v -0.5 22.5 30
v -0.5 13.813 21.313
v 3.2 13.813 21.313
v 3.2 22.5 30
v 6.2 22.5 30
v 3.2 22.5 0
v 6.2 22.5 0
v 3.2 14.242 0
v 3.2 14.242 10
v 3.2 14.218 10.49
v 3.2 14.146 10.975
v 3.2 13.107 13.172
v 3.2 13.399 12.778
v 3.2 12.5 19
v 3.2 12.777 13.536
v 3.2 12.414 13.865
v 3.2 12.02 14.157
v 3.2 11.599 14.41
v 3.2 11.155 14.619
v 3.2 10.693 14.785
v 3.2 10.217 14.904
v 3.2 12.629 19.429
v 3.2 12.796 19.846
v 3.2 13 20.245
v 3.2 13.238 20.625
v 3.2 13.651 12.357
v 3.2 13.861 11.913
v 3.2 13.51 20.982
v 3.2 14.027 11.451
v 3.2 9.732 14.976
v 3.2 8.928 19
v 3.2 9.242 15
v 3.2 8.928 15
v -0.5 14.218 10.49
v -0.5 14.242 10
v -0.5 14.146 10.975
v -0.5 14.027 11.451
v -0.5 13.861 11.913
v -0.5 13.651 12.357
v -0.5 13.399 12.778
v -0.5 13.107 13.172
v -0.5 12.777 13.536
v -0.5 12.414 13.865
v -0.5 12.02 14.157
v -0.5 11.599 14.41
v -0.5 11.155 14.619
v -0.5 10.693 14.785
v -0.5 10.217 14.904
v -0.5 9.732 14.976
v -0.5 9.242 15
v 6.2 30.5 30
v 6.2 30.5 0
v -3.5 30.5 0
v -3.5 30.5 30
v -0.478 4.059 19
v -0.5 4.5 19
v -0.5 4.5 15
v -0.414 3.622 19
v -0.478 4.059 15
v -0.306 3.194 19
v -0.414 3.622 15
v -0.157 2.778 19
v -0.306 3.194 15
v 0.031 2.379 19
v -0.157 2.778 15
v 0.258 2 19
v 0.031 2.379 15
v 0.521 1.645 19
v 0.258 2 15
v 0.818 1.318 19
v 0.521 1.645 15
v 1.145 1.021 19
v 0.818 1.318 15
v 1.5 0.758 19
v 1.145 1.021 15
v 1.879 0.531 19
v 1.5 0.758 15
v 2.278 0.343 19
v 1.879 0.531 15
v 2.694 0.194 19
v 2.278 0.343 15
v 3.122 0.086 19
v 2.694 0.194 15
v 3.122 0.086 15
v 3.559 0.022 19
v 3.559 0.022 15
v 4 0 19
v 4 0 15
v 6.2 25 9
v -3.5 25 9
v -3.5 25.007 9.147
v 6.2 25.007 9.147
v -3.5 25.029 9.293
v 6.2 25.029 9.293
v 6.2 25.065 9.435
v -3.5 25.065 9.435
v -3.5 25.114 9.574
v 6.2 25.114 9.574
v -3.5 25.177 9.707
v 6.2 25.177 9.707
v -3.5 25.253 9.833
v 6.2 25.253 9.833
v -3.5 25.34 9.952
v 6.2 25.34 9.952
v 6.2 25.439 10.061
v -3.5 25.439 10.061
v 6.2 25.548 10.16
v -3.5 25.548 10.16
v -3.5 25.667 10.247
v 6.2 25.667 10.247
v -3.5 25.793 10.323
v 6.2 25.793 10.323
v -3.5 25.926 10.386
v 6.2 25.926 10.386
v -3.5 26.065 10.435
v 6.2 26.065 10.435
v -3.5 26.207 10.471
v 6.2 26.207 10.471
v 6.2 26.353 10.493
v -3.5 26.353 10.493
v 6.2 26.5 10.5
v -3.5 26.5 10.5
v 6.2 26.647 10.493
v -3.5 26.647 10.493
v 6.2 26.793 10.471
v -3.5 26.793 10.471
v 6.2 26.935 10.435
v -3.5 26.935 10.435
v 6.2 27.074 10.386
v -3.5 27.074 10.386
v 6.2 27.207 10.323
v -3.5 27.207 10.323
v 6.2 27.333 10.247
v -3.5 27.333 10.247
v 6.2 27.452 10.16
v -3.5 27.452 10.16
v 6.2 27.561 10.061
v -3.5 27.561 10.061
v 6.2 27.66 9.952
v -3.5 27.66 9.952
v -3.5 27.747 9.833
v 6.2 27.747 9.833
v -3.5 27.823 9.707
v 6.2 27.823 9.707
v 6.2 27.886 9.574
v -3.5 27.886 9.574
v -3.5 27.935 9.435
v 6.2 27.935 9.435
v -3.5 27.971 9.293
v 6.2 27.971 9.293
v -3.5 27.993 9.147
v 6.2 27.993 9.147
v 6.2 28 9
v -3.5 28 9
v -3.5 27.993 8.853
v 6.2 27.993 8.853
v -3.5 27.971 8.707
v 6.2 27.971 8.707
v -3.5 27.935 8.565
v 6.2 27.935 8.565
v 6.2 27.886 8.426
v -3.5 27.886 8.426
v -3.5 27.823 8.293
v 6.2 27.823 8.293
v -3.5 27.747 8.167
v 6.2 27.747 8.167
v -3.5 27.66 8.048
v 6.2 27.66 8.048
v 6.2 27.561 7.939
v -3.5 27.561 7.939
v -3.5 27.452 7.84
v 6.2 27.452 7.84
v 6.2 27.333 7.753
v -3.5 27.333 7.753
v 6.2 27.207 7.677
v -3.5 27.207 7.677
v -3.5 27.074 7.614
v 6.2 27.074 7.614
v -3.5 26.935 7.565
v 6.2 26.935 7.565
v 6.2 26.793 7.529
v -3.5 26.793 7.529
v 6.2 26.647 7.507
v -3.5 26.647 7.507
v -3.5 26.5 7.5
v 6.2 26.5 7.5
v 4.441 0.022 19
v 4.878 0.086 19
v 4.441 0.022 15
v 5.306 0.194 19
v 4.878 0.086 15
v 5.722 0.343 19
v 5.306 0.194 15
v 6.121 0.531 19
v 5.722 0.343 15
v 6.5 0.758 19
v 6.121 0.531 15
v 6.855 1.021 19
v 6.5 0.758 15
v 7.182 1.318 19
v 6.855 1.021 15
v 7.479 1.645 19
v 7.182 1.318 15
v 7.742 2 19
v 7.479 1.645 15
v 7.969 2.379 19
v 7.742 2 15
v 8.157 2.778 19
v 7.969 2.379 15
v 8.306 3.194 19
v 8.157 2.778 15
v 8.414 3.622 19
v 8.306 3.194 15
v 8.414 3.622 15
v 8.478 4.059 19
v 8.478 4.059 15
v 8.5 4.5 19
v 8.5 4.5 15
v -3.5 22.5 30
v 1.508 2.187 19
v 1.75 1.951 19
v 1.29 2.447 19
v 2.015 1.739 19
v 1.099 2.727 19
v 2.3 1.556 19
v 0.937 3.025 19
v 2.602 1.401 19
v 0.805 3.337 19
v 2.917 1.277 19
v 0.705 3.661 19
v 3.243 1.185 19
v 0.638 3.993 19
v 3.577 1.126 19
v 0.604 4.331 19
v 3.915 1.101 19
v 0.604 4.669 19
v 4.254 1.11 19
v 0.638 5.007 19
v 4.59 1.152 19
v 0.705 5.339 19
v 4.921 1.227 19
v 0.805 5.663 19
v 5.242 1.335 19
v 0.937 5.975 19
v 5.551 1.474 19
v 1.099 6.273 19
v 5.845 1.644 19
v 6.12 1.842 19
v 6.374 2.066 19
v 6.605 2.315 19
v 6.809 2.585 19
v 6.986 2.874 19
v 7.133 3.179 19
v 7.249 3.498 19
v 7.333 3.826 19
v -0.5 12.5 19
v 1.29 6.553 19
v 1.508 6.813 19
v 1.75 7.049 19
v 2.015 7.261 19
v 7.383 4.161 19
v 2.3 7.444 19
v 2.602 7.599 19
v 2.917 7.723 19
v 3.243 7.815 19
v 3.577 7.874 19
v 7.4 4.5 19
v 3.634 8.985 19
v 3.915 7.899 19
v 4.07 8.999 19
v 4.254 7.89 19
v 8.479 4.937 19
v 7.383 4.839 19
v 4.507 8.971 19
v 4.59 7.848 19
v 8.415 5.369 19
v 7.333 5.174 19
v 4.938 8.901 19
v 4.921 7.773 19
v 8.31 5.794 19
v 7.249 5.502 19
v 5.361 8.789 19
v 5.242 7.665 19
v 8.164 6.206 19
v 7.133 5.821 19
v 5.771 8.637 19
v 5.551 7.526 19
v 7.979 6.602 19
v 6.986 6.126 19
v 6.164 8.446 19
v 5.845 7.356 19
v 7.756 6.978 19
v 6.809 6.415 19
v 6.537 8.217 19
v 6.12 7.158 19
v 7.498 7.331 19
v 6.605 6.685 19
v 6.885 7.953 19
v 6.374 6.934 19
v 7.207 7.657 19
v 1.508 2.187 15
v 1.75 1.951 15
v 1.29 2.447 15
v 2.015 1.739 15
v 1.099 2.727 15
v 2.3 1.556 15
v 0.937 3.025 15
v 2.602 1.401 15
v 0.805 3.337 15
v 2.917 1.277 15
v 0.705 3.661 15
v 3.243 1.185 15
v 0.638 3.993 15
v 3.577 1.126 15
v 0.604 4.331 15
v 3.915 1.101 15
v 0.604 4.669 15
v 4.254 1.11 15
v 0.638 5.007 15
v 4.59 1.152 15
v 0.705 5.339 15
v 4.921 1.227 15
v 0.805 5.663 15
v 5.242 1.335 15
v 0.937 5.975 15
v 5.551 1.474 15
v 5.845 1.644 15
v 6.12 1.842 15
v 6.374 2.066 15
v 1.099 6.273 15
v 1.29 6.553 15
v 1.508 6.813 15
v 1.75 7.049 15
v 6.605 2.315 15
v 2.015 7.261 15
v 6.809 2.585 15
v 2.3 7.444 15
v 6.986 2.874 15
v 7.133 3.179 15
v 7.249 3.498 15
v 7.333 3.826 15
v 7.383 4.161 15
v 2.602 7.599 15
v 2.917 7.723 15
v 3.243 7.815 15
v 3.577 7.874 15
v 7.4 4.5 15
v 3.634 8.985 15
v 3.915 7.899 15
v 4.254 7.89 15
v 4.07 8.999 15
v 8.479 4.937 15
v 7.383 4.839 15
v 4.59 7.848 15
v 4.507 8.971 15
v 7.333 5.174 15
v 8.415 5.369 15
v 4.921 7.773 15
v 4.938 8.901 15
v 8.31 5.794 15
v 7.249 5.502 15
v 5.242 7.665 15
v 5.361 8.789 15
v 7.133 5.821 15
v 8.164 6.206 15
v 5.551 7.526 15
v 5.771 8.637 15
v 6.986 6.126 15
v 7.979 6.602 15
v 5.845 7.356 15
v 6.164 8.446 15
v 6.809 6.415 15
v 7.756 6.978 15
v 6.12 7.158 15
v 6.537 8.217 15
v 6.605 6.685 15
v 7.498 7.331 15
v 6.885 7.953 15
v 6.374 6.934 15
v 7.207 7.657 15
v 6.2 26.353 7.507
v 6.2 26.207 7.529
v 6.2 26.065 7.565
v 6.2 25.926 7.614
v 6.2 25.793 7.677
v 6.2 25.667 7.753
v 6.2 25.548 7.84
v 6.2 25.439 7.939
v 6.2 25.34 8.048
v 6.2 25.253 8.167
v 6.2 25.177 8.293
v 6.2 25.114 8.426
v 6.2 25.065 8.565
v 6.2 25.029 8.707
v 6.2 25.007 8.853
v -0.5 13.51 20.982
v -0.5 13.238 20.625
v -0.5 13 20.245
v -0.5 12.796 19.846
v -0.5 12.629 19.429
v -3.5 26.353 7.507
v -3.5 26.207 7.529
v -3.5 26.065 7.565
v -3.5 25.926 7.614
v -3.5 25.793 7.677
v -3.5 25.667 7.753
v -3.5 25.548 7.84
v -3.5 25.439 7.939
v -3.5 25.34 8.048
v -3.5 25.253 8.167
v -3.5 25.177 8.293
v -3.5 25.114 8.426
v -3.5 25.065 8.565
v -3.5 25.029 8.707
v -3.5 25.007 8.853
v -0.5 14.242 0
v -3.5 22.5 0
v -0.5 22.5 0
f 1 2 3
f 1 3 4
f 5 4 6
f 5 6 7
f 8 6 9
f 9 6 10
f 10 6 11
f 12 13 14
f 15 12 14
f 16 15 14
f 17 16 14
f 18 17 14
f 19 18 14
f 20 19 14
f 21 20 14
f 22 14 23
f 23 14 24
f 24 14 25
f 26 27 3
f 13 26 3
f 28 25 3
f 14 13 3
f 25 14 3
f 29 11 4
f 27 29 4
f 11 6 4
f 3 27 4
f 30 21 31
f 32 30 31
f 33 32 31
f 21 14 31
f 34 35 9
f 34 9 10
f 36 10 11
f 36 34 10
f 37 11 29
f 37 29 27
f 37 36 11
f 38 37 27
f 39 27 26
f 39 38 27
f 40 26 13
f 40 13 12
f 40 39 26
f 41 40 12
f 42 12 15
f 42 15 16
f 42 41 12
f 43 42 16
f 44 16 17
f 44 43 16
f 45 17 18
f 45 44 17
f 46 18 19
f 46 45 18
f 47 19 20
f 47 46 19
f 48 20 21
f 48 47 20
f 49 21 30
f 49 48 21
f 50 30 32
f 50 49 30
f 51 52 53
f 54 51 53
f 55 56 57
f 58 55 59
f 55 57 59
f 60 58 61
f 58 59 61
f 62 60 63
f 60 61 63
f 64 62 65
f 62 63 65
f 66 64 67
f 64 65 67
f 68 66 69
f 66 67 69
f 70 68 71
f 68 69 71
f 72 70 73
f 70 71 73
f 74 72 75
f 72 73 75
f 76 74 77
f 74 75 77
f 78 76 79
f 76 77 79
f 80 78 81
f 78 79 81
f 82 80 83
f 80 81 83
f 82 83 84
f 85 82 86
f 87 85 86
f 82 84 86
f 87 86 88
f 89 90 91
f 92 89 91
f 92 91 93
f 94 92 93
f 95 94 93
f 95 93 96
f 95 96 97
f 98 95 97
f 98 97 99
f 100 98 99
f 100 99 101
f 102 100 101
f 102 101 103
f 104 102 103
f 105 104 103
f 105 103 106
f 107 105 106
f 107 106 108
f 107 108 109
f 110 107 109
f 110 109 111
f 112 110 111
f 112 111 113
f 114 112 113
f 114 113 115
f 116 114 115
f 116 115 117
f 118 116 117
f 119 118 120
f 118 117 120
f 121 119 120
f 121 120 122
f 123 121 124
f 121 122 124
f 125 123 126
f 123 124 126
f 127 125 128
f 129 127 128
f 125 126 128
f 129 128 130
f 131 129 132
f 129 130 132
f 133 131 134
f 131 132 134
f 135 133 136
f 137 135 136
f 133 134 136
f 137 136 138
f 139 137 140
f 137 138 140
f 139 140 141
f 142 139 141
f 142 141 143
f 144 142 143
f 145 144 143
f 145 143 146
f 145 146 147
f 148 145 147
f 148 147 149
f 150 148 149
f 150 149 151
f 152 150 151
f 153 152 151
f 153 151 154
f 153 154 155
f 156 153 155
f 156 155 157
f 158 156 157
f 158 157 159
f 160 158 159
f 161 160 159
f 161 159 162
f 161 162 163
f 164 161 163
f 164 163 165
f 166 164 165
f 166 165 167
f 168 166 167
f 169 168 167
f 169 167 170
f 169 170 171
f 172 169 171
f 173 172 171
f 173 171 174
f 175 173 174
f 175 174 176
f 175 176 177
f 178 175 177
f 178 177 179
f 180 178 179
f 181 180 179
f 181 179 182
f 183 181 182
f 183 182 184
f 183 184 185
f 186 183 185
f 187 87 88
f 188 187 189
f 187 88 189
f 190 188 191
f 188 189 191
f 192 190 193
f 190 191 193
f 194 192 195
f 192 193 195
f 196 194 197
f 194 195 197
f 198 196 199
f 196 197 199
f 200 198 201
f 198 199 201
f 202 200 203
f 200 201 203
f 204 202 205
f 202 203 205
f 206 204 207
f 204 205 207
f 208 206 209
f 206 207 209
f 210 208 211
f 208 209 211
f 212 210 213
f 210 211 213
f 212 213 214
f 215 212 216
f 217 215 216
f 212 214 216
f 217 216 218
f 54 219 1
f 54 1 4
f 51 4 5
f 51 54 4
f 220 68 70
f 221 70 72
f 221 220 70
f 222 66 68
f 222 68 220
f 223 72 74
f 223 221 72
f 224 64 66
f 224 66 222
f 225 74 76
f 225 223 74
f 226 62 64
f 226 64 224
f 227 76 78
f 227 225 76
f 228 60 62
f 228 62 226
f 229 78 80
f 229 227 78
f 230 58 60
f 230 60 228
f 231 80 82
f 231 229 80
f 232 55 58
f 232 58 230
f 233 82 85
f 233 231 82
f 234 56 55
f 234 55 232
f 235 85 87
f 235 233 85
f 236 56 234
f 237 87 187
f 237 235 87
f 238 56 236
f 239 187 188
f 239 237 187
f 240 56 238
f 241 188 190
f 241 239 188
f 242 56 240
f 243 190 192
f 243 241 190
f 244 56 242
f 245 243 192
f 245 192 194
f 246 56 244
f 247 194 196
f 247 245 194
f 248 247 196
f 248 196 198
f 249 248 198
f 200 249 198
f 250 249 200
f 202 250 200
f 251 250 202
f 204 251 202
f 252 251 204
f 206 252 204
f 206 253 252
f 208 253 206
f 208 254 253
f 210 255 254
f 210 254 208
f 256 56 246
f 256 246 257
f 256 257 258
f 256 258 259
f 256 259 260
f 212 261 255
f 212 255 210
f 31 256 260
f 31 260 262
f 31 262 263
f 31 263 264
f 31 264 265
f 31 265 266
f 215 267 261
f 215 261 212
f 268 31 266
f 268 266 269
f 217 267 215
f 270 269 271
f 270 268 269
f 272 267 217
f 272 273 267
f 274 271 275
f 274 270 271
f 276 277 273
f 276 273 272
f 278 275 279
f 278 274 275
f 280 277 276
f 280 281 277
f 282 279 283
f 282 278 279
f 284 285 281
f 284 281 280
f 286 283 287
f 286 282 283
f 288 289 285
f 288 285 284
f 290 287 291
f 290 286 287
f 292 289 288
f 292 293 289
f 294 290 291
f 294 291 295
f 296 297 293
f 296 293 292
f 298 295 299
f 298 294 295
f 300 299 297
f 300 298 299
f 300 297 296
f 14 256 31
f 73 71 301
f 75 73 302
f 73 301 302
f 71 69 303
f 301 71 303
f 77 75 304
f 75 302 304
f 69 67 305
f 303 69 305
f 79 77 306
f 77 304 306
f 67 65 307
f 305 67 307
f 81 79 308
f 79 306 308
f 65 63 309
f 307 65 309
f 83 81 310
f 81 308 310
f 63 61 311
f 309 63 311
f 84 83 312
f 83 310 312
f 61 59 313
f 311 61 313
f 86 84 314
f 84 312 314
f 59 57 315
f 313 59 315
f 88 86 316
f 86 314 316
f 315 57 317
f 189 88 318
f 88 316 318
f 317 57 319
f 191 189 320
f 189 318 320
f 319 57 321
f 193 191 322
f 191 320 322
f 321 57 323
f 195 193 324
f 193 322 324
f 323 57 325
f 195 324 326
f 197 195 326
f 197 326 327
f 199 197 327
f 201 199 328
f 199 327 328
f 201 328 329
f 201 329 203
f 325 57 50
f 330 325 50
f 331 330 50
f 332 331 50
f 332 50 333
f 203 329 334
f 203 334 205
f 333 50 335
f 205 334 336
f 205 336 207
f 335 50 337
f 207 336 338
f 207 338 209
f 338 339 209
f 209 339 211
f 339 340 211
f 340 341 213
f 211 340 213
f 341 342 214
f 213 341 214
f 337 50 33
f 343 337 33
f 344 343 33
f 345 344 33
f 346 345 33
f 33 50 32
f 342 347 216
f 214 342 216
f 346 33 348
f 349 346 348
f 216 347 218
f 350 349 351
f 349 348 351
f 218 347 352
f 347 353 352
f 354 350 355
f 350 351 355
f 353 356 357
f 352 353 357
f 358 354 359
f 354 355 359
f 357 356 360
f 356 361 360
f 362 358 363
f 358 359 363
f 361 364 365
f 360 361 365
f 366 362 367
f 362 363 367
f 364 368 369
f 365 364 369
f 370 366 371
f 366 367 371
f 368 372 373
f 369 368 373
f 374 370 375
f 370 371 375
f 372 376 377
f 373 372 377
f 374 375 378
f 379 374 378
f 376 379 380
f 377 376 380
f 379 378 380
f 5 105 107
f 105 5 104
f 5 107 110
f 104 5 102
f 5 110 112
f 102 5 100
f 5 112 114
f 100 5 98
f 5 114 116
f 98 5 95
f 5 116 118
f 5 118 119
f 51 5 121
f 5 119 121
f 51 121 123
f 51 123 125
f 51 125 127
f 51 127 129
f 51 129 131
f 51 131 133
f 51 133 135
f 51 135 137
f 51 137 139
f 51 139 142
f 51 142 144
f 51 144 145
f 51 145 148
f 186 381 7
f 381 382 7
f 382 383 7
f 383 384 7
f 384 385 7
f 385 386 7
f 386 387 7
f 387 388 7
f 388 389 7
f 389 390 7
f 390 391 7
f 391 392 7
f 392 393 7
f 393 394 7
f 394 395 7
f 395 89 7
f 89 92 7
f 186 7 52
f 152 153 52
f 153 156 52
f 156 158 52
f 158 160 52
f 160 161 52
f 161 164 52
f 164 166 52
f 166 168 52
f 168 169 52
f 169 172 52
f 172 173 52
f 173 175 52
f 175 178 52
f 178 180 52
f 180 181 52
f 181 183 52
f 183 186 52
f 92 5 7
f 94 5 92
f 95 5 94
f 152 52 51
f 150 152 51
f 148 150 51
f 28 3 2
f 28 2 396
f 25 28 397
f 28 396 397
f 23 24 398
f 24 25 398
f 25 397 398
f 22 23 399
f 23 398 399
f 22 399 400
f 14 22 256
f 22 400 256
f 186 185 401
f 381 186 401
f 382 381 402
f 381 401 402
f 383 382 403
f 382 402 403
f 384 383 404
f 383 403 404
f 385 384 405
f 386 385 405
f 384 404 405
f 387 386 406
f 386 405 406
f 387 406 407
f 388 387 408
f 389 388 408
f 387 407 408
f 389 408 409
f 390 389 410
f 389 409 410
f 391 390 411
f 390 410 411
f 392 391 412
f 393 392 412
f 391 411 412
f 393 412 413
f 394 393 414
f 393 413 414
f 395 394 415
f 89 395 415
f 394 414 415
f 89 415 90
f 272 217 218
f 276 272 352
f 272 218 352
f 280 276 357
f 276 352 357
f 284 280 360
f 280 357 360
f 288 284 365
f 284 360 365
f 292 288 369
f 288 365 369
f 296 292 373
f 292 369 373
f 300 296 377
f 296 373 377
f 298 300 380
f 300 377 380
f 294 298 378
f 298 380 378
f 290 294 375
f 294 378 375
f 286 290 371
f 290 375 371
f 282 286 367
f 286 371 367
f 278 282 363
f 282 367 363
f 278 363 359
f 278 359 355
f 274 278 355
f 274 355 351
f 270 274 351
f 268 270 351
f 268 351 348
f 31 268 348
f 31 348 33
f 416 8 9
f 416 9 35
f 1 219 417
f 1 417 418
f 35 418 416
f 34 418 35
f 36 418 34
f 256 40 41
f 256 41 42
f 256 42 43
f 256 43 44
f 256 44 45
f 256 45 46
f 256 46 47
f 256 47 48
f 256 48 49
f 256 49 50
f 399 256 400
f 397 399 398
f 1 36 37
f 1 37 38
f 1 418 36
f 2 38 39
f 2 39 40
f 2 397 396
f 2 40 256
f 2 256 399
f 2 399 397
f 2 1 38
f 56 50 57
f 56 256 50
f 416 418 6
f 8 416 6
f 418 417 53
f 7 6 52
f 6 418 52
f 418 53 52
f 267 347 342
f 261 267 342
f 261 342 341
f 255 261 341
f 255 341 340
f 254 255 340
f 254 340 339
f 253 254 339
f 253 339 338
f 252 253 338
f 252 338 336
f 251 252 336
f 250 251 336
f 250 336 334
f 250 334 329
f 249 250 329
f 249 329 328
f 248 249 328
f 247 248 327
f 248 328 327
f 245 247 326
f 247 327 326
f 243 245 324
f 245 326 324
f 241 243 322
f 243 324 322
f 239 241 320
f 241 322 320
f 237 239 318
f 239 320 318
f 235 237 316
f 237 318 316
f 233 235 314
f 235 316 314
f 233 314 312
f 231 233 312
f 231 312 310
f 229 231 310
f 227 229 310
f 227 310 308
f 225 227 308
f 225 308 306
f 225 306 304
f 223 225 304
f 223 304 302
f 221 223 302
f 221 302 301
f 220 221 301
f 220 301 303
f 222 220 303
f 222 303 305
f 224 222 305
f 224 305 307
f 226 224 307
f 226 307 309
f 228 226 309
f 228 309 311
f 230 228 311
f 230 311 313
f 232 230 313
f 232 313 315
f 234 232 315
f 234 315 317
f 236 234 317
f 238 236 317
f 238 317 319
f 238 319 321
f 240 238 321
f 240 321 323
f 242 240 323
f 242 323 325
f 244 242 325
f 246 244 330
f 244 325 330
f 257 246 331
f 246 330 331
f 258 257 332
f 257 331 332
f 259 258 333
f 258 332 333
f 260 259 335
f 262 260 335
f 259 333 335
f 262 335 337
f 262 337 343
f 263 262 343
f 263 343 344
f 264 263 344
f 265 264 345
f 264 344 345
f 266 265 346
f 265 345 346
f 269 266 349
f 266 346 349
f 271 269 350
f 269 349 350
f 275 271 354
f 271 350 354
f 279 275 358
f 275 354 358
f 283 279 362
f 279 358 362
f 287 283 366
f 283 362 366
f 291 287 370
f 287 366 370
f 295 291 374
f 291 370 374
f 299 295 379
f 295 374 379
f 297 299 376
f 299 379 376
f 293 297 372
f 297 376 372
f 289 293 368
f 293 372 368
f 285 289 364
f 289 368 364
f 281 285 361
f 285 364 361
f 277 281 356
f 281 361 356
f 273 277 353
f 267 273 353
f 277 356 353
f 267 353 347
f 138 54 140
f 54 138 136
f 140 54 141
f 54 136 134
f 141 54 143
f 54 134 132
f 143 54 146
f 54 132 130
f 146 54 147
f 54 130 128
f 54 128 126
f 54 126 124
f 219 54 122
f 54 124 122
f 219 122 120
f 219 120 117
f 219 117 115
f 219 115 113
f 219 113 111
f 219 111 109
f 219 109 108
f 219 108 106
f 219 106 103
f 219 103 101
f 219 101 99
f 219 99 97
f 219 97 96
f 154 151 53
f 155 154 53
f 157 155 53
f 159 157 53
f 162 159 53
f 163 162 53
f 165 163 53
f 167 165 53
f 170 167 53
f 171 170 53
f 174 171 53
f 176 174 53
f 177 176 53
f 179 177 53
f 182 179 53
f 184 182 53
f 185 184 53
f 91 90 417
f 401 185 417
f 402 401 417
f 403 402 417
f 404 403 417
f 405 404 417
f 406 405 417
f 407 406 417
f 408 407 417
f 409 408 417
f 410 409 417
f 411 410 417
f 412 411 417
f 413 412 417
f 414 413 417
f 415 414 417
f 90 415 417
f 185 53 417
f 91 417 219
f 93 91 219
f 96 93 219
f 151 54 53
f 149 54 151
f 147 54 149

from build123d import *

# Parameters (mm, degrees)
F1_DEPTH     = 19
F3_DEPTH     = 11
F4_R         = 3.4
F5_DEPTH     = 25
F8_DEPTH     = 25
F9_T1_DEPTH  = 55.1336597593
F10_DEPTH    = 15
F11_T1_DEPTH = 3.7
F11_T3_DEPTH = 12.9815131525


# Not quite as in the source:
# - a fillet or chamfer that OpenCascade refuses, or shapes differently, is made with other operations: its cross-section is extruded or revolved along the edge and cut away or added


with BuildPart() as f1:
    # F0 (on Top) → F1 (new body)
    with BuildSketch(Plane.XY):
        with BuildLine():
            ThreePointArc((4, 0), (7.1819805153, 1.3180194847), (8.5, 4.5))
            ThreePointArc((8.5, 4.5), (6.8853076093, 7.95325933), (3.2, 8.9283179651))
            ThreePointArc((3.2, 8.9283179651), (0.54674067, 7.3853076093), (-0.5, 4.5))
            ThreePointArc((-0.5, 4.5), (0.8180194847, 1.3180194847), (4, 0))
        make_face()
        with BuildLine():
            ThreePointArc((-0.5, 4.5), (0.54674067, 7.3853076093), (3.2, 8.9283179651))
            Line((3.2, 8.9283179651), (3.2, 22.5))
            Line((3.2, 22.5), (6.2, 22.5))
            Line((6.2, 22.5), (6.2, 30.5))
            Line((6.2, 30.5), (-3.5, 30.5))
            Line((-3.5, 30.5), (-3.5, 22.5))
            Line((-3.5, 22.5), (-0.5, 22.5))
            Line((-0.5, 22.5), (-0.5, 4.5))
        make_face()
    extrude(amount=F1_DEPTH)

    # F2 (on face) → F3 (join)
    with BuildSketch(Plane.XY.offset(19)):
        Polygon((6.2, 30.5), (-3.5, 30.5), (-3.5, 22.5), (-0.5, 22.5), (-0.5, 12.5), (3.2, 12.5), (3.2, 22.5), (6.2, 22.5), align=None)
    extrude(amount=F3_DEPTH)

    # F4 (on face) → F5 (cut)
    with BuildSketch(Plane(origin=(0, 0, 0), x_dir=(1, 0, 0), z_dir=(0, 0, -1))):
        with Locations((4, -4.5)):
            Circle(F4_R)
    extrude(amount=-F5_DEPTH, mode=Mode.SUBTRACT)

    # F7 (on face) → F8 (cut)
    with BuildSketch(Plane(origin=(-3.5, 0, 0), x_dir=(0, -1, 0), z_dir=(-1, 0, 0))):
        with BuildLine():
            ThreePointArc((-26.5, 7.5), (-25.4393398282, 7.9393398282), (-25, 9))
            ThreePointArc((-25, 9), (-27.5606601718, 10.0606601718), (-26.5, 7.5))
        make_face()
    extrude(amount=-F8_DEPTH, mode=Mode.SUBTRACT)

    # F9: chamfer of 10 on 1 edges, made by hand

    # F9_s2 → F9_t1 (cut)
    with BuildSketch(Plane.YZ.offset(-26.2168298797)):
        Polygon((12.5, 20), (22.5, 30), (12.5, 30), align=None)
    extrude(amount=F9_T1_DEPTH, mode=Mode.SUBTRACT)

    # F6 (on Top) → F10 (cut)
    with BuildSketch(Plane.XY):
        Polygon((-2.952047158, 0), (0, 0), (4.1492179482, 0), (5.4492179482, 0), (9.2530830997, 0), (9.2530830997, 9.0487509014), (9.2530830997, 14.2418248579), (-2.952047158, 14.2418248579), align=None)
    extrude(amount=F10_DEPTH, mode=Mode.SUBTRACT)

    # F11: fillet of radius 5 on 2 edges, made by hand

    # F11_s2 → F11_t1 (join)
    with BuildSketch(Plane.YZ.offset(-0.5)):
        with BuildLine():
            ThreePointArc((14.2418248579, 10), (12.7773587638, 13.5355339059), (9.2418248579, 15))
            Line((9.2418248579, 15), (14.2418248579, 15))
            Line((14.2418248579, 15), (14.2418248579, 10))
        make_face()
    extrude(amount=F11_T1_DEPTH)

    # F11_s4 → F11_t3 (cut)
    with BuildSketch(Plane.YZ.offset(-5.1407565762)):
        with BuildLine():
            ThreePointArc((13.812604178, 21.312604178), (12.9997448715, 20.2451619378), (12.5, 19))
            Line((12.5, 19), (12.5, 20))
            Line((12.5, 20), (13.812604178, 21.312604178))
        make_face()
    extrude(amount=F11_T3_DEPTH, mode=Mode.SUBTRACT)


solid = f1.part
